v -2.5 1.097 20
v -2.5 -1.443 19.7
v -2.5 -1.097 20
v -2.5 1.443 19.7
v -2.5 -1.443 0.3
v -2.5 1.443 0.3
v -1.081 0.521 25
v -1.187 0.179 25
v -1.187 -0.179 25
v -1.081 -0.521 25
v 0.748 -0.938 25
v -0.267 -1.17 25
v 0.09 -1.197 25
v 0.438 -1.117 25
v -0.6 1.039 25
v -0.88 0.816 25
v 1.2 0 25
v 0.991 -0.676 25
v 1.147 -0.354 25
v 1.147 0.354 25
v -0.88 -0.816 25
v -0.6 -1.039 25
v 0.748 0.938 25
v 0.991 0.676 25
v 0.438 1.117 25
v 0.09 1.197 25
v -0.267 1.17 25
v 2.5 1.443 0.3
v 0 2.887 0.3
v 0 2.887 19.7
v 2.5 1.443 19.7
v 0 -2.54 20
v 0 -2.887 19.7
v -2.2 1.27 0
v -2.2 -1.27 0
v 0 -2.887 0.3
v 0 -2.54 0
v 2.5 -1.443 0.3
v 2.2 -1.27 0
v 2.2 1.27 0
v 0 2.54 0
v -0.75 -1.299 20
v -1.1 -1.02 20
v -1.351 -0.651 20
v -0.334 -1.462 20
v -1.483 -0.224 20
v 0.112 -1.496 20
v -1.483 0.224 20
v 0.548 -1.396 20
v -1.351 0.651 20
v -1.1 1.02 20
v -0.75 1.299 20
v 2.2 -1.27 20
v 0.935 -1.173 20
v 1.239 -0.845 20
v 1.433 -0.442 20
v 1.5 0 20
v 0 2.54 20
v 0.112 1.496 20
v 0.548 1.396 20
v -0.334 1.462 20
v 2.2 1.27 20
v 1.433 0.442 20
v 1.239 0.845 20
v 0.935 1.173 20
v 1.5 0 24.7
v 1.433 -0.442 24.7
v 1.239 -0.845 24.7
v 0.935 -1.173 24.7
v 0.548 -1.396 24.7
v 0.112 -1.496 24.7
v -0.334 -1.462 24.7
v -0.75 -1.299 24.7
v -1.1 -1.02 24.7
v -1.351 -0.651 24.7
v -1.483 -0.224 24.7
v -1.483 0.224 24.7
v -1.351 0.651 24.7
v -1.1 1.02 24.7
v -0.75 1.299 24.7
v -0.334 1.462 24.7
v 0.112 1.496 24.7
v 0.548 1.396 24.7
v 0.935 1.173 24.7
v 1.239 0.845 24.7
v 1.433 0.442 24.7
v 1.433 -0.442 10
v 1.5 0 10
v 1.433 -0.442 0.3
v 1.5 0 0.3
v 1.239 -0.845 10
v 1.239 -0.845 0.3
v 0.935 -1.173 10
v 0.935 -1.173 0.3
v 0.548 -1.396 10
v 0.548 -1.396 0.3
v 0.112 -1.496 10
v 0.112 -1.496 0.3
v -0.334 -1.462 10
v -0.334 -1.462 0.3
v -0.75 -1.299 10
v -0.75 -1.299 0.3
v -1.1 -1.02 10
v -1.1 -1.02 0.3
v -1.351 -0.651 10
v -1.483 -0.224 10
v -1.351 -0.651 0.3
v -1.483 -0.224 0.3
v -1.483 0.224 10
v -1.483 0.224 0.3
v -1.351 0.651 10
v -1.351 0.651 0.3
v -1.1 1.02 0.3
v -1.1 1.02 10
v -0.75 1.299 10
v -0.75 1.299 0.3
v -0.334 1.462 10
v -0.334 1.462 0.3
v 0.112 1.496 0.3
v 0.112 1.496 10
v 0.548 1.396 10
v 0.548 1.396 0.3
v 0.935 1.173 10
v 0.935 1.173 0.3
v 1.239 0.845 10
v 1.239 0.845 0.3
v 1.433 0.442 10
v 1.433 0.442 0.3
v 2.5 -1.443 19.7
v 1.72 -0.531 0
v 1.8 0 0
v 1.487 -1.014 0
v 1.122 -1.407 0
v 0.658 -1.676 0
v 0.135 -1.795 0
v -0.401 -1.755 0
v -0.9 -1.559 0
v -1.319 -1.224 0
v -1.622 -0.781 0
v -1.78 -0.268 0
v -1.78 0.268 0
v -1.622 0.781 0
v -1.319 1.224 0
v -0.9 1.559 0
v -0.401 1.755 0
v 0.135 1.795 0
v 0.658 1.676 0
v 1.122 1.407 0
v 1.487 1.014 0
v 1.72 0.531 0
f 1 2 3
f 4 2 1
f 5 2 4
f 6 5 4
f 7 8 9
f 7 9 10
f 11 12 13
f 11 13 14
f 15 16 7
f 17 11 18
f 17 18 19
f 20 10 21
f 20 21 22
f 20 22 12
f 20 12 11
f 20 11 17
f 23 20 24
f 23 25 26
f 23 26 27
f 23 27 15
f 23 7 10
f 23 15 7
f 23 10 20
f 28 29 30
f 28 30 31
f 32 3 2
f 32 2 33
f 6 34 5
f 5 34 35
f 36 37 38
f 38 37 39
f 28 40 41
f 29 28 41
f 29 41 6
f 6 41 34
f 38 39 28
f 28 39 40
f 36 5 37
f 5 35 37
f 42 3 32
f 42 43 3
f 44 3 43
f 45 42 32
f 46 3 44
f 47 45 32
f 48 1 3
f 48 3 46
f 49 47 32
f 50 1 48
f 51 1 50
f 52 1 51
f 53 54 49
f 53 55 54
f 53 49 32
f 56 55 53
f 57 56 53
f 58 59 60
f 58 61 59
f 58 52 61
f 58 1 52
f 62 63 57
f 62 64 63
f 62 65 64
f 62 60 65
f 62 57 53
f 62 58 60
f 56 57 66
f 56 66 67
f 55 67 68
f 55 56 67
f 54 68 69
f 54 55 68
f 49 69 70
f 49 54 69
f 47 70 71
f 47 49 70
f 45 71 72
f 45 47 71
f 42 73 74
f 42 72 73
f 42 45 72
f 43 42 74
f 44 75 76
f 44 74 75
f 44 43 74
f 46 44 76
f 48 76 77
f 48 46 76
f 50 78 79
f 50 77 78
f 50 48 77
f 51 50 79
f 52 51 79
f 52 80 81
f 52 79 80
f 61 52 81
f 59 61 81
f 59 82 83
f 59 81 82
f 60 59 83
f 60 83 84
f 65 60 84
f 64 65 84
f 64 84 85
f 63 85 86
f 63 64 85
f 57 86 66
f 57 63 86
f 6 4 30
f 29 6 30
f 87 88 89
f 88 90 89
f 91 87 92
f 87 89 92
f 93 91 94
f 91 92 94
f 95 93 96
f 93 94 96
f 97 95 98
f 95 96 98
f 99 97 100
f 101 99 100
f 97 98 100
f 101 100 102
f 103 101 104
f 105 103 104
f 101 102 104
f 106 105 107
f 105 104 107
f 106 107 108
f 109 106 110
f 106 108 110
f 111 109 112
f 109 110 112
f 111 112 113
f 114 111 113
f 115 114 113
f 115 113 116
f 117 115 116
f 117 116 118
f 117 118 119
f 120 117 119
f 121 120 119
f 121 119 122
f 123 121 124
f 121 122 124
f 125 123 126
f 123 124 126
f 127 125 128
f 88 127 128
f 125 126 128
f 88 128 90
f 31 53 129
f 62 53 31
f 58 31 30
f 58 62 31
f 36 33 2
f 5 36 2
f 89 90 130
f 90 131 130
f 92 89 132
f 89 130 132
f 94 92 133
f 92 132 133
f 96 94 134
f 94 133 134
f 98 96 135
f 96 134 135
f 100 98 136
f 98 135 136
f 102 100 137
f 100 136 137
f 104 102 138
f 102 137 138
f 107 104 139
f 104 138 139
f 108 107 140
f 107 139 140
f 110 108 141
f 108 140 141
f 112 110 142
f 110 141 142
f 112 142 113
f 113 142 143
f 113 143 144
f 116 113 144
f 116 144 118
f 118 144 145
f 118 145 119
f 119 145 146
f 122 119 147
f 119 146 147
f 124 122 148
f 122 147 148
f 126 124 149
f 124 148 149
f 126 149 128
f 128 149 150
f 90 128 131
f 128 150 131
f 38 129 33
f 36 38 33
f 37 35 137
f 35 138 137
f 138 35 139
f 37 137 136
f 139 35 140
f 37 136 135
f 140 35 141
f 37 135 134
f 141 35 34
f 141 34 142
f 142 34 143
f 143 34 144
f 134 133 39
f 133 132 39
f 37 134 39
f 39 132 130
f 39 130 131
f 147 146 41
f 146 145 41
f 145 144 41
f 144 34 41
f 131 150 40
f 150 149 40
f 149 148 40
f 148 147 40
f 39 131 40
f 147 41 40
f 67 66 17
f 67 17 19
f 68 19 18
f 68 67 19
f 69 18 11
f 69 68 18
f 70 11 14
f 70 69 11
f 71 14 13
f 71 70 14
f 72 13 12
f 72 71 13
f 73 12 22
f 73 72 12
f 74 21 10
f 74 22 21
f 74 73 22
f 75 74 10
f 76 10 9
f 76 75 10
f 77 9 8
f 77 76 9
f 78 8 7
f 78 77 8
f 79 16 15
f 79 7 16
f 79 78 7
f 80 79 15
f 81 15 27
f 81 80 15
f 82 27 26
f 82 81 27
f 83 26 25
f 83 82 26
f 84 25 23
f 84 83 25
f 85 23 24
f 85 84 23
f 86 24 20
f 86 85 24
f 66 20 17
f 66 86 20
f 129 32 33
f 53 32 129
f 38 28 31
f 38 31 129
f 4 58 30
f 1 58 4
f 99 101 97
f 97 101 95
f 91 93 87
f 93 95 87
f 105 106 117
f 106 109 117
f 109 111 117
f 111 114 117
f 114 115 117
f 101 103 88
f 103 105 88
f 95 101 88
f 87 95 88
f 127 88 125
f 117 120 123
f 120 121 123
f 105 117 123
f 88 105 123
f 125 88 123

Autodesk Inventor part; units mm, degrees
ref_plane "YZ Plane" through (0, 0, 0) normal (1, 0, 0) x (0, 1, 0)
ref_plane "XZ Plane" through (0, 0, 0) normal (0, 1, 0) x (-1, 0, 0)
ref_plane "XY Plane" through (0, 0, 0) normal (0, 0, 1) x (1, 0, 0)
sketch "Skizze1" plane through (0, 0, 0) normal (0, 0, 1) x (1, 0, 0)
  line L0 (0, 2.8868) -> (2.5, 1.4434)
  line L1 (2.5, 1.4434) -> (2.5, -1.4434)
  line L2 (2.5, -1.4434) -> (0, -2.8868)
  line L3 (0, -2.8868) -> (-2.5, -1.4434)
  line L4 (-2.5, -1.4434) -> (-2.5, 1.4434)
  line L5 (-2.5, 1.4434) -> (0, 2.8868)
  circle A0 centre (0, 0) radius 1.5
  dimension "d0" = 5
  dimension "d1" = 3
extrude "Extrusion1" add sketch "Skizze1" along normal blind 20
chamfer "Fase1" distance 0.3 angle 45 13 edges at (1.25, -2.1651, 20) (-1.25, -2.1651, 20) (2.5, 0, 20) (1.25, 2.1651, 20) (-1.25, 2.1651, 20) (1.25, -2.1651, 0) (2.5, 0, 0) (-1.25, -2.1651, 0) (1.25, 2.1651, 0) (-1.25, 2.1651, 0) (-2.5, 0, 0) (-1.5, 0, 20) (-1.5, 0, 0)
thread "Gewinde1" size "M3x0.5" class "6H" standard "ANSI Metric M Profile" full length
sketch "Skizze2" plane through (0, 0, 20) normal (0, 0, 1) x (1, 0, 0)
  line L0 (0, -2.5403) -> (-2.5, -1.097) projected
  line L1 (2.2, -1.2702) -> (0, -2.5403) projected
  line L2 (2.2, 1.2702) -> (2.2, -1.2702) projected
  line L3 (0, 2.5403) -> (2.2, 1.2702) projected
  line L4 (-2.5, 1.097) -> (0, 2.5403) projected
  line L5 (-2.5, 1.097) -> (-2.5, -1.097) projected
  circle A0 centre (0, 0) radius 1.8 projected
extrude "Extrusion2" add sketch "Skizze2" against normal blind 10 contours A0
sketch "Skizze3" plane through (0, 0, 20) normal (0, 0, 1) x (1, 0, 0)
  circle A0 centre (0, 0) radius 1.5
  dimension "d11" = 3
extrude "Extrusion3" add sketch "Skizze3" along normal blind 5
thread "Gewinde2" size "M3x0.5" class "6g" standard "ANSI Metric M Profile" full length
chamfer "Fase2" distance 0.3 angle 45 1 edges at (-1.5, 0, 25)
properties part number "Distanzhuelse_M3x20mm_" material "Nickel-Kupfer-Legierung 400"
